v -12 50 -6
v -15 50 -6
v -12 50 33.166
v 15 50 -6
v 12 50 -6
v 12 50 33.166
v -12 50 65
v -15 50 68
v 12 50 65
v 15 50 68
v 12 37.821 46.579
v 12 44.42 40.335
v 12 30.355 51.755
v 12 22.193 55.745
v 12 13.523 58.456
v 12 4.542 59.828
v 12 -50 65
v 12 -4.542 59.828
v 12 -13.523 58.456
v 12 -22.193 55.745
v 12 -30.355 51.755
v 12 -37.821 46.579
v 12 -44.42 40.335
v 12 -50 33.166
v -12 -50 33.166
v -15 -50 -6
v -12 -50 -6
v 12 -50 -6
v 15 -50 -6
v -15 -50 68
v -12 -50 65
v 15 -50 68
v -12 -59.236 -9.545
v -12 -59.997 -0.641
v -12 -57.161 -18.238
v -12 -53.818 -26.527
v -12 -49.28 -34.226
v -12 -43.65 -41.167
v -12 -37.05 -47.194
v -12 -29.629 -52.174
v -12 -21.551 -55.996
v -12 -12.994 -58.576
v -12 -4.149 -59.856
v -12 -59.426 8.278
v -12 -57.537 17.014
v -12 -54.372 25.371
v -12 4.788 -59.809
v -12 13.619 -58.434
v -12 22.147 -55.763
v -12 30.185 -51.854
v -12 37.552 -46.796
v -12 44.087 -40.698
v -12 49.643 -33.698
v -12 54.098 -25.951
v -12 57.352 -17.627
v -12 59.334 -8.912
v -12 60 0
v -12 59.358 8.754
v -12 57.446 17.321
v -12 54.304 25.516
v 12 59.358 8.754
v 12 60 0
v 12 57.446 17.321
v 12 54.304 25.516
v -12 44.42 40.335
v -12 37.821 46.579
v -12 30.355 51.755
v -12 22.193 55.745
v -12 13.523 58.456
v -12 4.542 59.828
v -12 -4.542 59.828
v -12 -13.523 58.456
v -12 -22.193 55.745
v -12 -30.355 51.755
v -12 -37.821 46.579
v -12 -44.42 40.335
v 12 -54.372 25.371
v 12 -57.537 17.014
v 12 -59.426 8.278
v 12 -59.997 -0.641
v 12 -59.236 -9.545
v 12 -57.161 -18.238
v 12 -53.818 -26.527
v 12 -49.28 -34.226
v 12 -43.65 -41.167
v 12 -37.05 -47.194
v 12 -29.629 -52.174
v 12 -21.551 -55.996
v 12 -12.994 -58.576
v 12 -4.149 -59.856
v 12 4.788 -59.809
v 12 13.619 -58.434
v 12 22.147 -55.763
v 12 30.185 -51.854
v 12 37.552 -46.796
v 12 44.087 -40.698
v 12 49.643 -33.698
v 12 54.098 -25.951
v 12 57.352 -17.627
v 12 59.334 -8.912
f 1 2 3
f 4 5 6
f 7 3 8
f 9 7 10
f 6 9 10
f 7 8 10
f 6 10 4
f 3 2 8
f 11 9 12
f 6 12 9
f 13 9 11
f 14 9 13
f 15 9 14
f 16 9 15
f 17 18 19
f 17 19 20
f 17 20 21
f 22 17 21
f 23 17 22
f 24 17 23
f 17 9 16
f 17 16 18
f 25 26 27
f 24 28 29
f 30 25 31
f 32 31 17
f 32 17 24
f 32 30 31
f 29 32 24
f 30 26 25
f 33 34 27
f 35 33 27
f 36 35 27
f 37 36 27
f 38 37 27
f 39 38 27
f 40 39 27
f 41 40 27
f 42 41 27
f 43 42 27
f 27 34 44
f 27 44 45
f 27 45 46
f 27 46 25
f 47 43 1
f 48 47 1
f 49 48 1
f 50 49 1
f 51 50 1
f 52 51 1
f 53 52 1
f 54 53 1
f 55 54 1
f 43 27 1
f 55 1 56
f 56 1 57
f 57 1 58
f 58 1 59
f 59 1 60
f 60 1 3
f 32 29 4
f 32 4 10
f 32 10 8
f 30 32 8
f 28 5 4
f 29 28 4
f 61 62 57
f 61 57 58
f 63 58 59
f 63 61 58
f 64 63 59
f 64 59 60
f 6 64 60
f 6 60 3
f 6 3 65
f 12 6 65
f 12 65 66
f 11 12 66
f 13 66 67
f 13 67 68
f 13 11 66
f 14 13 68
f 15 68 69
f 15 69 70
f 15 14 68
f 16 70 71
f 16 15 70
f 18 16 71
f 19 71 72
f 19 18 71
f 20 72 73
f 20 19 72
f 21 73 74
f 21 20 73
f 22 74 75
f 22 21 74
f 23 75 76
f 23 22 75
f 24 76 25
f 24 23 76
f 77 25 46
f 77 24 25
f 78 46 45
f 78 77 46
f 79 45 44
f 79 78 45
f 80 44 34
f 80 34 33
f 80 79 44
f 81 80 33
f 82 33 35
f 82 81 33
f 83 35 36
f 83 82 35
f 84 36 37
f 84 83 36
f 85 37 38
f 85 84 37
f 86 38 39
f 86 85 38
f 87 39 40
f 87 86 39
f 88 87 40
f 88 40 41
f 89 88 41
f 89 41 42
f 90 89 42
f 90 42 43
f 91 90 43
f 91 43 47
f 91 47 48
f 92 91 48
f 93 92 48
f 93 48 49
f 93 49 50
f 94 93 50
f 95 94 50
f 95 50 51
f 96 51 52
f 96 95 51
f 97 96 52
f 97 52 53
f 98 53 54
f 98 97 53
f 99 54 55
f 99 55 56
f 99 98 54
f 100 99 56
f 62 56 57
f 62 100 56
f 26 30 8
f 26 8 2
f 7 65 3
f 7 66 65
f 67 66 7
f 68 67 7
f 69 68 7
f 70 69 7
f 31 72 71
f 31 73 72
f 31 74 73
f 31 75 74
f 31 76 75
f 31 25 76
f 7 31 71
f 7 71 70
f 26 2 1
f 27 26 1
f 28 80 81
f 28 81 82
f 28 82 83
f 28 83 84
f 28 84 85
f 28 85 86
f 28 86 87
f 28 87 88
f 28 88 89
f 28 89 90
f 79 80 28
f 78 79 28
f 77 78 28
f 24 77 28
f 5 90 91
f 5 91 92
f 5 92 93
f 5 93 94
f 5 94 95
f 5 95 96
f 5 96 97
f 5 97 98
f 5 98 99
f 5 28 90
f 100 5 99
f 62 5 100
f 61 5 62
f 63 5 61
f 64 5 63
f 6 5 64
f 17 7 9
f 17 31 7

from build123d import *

# Parameters (mm, degrees)
F1_DEPTH = 50
F2_R     = 60
F3_DEPTH = 12


with BuildPart() as f1:
    # F0 (on Front) → F1 (new body, symmetric)
    with BuildSketch(Plane.XZ):
        Polygon((-12, 65), (0, 65), (12, 65), (12, -6), (15, -6), (15, 68), (0, 68), (-15, 68), (-15, -6), (-12, -6), align=None)
    extrude(amount=F1_DEPTH, both=True)

    # F2 (on Right) → F3 (join, symmetric)
    with BuildSketch(Plane.YZ):
        Circle(F2_R)
    extrude(amount=F3_DEPTH, both=True)


solid = f1.part
